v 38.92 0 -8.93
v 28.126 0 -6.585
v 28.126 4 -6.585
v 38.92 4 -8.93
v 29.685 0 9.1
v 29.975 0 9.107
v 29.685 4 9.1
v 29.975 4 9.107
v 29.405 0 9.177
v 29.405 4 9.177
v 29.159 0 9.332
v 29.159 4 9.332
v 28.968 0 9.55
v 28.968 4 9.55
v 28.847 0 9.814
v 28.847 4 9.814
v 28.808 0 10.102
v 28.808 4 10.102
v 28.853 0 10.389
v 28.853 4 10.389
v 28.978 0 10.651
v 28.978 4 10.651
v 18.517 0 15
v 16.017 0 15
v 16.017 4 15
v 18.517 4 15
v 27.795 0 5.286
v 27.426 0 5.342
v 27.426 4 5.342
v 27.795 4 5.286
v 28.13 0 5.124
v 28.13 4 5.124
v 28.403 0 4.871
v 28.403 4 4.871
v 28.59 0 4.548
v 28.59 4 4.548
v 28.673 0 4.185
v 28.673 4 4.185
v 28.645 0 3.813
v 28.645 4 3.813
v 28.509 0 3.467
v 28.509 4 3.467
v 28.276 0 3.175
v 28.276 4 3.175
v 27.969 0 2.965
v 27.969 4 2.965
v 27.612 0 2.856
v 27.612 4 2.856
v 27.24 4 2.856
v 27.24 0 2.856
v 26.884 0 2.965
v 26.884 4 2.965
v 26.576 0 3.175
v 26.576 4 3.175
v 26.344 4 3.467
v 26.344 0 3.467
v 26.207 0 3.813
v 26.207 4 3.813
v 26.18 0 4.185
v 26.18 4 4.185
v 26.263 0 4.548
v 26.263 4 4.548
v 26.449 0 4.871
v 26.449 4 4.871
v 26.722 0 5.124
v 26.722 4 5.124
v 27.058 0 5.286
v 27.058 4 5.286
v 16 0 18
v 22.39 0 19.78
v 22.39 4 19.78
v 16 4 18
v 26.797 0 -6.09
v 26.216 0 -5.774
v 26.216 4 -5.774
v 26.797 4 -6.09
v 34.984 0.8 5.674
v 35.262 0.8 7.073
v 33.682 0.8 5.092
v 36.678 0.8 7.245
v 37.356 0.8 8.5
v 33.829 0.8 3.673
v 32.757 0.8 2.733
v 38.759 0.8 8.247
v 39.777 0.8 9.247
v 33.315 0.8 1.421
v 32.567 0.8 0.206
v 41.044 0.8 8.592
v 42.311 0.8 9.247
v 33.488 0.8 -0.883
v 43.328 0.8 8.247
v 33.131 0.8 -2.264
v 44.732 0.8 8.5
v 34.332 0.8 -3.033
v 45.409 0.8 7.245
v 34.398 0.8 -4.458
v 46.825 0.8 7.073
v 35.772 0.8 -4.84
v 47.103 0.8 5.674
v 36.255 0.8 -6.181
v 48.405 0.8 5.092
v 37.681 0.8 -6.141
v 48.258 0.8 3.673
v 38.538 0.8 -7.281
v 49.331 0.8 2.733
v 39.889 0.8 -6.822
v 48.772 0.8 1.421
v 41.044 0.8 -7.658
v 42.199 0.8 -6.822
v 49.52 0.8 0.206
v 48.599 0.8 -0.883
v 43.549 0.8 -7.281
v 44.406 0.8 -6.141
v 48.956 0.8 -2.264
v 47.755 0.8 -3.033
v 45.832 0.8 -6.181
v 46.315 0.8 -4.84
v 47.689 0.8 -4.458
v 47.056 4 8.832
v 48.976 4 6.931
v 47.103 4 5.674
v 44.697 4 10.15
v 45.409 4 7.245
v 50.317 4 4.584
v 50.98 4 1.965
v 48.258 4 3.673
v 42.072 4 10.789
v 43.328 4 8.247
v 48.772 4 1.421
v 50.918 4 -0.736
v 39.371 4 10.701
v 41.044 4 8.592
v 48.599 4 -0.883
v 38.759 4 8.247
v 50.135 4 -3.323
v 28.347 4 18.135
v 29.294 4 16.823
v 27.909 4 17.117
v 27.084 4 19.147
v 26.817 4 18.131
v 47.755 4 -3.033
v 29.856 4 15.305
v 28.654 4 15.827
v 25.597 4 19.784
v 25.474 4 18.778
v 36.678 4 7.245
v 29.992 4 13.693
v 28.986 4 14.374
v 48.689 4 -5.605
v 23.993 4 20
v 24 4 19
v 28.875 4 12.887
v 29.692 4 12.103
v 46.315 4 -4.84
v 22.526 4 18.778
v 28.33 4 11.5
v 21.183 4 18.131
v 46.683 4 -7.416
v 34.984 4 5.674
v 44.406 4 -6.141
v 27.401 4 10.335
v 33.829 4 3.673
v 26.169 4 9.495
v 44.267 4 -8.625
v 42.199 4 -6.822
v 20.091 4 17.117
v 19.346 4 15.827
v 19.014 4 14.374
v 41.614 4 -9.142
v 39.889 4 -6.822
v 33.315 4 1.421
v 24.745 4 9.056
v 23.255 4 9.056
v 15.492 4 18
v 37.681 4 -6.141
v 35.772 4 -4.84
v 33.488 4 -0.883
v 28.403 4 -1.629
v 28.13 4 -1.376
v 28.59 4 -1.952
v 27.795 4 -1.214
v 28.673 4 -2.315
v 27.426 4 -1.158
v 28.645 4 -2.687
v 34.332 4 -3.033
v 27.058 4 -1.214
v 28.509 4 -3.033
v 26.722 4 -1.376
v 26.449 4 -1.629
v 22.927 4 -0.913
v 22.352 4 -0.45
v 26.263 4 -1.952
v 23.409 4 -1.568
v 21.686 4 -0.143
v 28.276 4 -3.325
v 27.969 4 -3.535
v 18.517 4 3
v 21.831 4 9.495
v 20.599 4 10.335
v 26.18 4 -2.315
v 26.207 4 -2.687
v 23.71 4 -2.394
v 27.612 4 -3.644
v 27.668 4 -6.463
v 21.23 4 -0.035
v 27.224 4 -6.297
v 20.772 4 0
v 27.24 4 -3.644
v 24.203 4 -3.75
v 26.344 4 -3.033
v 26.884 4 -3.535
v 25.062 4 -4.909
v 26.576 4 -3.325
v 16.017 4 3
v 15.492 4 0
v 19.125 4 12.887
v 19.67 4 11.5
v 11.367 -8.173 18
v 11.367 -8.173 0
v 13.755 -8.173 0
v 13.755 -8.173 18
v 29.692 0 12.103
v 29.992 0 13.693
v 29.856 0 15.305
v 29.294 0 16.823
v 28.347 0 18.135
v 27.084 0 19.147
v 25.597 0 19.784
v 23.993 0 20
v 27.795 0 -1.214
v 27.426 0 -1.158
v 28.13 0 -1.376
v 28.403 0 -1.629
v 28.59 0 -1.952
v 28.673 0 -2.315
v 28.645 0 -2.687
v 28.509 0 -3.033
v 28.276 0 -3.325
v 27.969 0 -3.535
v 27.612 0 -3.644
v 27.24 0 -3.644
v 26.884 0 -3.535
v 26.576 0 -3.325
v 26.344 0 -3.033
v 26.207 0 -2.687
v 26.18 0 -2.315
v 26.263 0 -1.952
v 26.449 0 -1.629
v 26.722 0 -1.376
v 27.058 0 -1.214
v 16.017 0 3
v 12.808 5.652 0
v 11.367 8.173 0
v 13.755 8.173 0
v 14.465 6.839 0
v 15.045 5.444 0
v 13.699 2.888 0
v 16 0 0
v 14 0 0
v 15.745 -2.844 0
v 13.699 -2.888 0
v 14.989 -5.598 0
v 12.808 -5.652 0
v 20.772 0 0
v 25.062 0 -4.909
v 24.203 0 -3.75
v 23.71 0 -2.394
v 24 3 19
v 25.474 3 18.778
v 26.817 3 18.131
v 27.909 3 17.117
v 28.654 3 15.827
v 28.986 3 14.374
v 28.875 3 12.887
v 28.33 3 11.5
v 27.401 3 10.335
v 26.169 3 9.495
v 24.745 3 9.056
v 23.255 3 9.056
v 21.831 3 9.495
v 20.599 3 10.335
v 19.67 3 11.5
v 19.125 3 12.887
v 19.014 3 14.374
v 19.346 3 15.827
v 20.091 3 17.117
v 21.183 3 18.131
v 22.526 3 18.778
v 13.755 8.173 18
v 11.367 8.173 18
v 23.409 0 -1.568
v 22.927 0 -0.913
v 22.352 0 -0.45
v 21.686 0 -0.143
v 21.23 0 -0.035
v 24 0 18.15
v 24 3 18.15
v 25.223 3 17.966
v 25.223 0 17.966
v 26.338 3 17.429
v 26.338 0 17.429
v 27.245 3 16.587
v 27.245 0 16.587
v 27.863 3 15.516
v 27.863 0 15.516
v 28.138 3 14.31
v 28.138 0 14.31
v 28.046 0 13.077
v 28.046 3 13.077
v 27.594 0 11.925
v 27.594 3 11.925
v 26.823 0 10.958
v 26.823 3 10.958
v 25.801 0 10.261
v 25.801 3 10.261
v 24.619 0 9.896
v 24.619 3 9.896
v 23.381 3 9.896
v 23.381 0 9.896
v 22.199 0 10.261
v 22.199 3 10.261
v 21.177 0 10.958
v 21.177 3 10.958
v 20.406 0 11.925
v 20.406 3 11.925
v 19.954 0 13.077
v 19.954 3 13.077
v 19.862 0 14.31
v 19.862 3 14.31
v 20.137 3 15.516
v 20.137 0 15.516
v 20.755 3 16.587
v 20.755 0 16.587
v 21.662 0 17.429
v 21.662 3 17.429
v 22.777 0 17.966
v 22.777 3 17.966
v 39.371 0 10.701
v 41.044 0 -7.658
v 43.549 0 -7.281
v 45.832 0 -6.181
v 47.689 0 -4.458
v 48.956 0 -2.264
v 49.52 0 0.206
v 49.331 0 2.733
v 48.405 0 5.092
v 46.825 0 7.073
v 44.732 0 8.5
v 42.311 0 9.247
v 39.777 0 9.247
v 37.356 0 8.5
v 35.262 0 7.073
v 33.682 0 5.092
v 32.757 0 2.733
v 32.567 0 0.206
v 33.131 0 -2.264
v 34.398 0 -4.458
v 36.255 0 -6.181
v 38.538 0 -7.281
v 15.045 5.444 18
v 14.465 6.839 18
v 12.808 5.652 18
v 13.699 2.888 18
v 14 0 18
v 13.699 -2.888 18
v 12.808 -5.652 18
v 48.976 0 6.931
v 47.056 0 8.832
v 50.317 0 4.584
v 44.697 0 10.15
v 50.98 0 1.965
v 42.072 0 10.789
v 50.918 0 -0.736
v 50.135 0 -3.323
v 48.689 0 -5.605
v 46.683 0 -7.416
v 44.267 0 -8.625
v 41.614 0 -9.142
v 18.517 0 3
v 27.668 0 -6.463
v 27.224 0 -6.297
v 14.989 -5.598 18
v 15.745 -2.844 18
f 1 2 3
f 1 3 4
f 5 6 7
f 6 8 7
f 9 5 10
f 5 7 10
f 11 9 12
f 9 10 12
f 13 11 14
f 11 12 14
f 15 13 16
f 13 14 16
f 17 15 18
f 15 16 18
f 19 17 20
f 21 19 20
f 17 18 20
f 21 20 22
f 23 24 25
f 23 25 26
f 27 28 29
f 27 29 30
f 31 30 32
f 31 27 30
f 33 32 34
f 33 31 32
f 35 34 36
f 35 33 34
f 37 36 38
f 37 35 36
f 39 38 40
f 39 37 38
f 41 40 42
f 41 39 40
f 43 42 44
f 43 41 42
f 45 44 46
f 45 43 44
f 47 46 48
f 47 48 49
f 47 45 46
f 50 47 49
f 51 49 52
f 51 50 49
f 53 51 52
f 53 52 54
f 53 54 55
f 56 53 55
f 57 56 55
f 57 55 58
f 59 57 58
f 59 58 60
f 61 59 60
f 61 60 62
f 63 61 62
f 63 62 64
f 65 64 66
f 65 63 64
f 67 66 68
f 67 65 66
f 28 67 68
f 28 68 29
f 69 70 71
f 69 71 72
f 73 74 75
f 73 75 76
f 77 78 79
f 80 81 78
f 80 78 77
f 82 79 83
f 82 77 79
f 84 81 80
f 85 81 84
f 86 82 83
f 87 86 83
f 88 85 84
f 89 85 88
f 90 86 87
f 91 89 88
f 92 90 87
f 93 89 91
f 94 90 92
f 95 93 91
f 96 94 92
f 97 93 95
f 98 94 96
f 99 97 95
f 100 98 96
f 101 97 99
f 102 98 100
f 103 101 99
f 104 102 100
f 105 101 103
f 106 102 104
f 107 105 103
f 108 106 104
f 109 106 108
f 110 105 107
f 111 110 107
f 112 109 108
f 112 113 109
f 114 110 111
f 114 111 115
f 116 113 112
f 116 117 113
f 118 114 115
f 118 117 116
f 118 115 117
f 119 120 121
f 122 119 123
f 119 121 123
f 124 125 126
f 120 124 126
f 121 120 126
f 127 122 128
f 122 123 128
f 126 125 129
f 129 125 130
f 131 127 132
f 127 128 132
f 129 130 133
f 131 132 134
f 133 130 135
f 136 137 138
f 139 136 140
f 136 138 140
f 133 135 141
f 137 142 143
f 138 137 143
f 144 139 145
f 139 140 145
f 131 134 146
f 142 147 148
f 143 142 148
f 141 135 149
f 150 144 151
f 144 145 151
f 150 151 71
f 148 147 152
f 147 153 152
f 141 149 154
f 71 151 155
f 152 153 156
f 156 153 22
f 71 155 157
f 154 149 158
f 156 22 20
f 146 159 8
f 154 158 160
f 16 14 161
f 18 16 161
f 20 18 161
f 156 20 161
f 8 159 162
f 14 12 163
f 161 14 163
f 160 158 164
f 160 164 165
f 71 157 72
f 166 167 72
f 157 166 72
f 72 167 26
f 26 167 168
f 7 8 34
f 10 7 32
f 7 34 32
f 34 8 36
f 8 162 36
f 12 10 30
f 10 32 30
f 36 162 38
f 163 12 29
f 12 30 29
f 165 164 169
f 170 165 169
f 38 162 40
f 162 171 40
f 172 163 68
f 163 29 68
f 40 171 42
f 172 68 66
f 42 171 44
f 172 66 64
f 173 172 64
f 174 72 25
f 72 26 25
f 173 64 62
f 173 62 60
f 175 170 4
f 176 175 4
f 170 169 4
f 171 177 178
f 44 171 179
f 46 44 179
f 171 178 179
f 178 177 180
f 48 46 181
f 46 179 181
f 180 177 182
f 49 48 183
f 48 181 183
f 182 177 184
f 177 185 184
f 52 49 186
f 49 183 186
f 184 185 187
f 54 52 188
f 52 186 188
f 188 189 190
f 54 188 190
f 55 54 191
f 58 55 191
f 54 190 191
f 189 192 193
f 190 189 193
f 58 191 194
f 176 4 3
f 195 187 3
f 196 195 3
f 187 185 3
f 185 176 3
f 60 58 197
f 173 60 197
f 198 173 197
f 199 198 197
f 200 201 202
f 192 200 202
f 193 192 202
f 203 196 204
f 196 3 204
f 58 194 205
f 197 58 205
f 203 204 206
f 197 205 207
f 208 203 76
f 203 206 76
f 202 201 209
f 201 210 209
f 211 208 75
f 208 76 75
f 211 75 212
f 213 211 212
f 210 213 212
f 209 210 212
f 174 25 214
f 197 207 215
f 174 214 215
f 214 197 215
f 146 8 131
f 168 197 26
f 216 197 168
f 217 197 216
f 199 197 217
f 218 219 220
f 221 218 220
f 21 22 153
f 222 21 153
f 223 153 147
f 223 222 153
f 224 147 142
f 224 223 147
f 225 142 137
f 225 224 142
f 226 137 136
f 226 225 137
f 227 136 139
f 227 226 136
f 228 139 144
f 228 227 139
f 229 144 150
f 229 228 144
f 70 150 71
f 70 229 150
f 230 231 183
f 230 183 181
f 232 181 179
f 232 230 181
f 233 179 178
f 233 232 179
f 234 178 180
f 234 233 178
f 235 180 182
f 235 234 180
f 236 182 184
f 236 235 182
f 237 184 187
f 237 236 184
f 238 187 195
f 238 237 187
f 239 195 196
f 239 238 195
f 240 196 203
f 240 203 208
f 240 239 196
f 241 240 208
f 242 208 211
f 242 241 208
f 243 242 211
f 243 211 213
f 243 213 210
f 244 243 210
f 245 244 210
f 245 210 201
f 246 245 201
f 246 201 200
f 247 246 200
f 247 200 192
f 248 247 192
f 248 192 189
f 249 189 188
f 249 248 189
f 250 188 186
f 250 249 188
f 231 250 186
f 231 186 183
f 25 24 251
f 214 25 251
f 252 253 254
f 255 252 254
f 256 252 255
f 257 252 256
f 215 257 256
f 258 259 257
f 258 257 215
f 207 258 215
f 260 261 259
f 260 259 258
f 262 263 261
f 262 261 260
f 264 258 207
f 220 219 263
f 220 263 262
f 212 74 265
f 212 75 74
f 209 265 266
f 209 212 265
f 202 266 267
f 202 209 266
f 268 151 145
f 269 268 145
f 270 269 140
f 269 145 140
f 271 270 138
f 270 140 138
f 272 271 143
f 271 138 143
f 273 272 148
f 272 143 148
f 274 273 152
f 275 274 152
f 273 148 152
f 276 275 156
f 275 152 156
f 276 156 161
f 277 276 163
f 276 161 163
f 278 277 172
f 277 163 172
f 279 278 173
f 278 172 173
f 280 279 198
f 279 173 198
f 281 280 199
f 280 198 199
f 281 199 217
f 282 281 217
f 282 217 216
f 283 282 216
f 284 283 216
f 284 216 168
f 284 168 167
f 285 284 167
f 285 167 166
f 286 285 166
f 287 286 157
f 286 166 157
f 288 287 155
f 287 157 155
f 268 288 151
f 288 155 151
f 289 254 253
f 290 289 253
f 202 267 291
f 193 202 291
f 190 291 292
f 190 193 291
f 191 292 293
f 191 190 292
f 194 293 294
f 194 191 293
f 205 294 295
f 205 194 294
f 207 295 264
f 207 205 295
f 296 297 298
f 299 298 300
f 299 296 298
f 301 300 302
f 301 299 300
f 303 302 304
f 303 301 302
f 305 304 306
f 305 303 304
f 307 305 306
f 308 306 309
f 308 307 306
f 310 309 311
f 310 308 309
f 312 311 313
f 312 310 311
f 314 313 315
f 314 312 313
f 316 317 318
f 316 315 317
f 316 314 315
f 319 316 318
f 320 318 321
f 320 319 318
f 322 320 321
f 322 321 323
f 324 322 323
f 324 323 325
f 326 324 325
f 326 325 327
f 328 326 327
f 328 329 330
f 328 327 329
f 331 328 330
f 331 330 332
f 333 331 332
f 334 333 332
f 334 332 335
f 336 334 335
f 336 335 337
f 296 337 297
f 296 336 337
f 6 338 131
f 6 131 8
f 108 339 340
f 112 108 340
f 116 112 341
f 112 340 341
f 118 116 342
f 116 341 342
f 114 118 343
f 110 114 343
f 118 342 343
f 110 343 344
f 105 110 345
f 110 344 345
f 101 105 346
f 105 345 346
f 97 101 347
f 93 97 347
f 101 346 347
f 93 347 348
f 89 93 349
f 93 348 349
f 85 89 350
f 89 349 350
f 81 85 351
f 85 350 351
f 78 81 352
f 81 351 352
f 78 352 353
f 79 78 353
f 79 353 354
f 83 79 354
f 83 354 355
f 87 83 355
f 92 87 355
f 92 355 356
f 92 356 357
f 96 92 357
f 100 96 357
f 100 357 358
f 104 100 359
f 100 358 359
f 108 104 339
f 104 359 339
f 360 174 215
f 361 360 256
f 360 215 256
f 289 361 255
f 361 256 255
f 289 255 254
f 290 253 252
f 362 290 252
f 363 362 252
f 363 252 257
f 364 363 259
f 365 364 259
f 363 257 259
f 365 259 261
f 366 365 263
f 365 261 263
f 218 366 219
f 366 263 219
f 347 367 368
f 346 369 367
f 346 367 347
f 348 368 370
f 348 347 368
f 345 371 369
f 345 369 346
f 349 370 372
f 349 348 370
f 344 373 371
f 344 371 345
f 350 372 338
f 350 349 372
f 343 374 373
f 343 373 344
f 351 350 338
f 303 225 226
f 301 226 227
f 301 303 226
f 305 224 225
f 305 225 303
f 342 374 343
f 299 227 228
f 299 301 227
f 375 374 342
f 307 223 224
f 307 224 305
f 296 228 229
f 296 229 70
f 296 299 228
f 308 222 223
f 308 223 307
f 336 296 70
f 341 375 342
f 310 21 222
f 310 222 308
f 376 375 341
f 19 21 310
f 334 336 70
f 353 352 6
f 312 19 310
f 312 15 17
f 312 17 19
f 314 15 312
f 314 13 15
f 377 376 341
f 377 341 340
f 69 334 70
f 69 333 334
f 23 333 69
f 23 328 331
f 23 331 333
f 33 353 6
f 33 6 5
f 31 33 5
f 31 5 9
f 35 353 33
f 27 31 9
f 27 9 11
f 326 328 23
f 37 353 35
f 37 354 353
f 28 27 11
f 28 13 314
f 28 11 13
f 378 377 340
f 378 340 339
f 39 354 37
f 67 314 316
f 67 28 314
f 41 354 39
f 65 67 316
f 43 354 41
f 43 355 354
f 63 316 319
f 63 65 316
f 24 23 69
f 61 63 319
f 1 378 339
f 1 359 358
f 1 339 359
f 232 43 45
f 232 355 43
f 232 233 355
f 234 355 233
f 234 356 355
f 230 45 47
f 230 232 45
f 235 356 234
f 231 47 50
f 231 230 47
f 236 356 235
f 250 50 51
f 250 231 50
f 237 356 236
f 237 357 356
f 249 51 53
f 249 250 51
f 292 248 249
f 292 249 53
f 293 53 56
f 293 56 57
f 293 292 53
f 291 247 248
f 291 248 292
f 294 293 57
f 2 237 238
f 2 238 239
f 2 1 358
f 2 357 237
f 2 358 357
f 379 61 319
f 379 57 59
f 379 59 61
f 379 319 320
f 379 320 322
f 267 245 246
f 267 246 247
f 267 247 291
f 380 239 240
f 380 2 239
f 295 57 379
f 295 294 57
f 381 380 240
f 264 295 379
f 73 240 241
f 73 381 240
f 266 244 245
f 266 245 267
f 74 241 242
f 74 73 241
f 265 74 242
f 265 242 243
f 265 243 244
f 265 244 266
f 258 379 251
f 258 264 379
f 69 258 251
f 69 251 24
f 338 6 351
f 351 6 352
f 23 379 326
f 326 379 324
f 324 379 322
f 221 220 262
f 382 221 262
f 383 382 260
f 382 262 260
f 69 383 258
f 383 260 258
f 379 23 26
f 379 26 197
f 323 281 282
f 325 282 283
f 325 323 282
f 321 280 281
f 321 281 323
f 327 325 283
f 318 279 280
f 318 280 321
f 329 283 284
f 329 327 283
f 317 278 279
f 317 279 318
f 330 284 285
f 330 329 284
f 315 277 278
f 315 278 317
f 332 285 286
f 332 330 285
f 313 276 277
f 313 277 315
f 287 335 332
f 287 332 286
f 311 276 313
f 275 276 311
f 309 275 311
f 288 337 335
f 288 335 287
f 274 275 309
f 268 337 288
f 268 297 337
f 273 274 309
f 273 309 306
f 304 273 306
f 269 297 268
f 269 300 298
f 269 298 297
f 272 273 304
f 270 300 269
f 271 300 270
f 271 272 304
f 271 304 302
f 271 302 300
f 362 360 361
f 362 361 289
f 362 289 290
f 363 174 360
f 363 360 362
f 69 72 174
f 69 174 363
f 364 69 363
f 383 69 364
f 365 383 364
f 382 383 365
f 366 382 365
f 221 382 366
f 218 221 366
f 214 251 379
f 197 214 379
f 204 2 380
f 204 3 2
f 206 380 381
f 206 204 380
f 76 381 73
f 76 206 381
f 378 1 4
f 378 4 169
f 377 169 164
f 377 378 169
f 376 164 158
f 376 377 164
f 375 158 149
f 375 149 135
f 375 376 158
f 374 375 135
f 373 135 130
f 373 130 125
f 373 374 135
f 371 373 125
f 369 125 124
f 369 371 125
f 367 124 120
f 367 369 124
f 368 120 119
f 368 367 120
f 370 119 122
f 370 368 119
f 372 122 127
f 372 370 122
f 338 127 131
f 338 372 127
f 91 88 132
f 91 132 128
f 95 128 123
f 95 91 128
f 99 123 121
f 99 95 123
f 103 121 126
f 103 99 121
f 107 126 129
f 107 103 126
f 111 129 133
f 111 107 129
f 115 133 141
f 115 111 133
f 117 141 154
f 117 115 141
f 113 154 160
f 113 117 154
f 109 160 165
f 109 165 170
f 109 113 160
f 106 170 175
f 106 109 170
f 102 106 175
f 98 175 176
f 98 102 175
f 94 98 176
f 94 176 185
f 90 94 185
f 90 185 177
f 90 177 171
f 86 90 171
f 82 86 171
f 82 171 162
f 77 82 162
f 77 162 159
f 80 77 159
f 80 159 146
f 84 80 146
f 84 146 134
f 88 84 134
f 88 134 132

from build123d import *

# Parameters (mm, degrees)
EXTRUDE_1_DEPTH     = 18
SKETCH_3_R          = 4.15
SKETCH_3_R_2        = 7.75
SKETCH_3_R_3        = 1.25
SKETCH_3_W          = 2.5
SKETCH_3_H          = 12
EXTRUDE_2_DEPTH     = 4
FILLET_1_R          = 5
FILLET_2_R          = 3
FILLET_3_R          = 1
SKETCH_7_R          = 8.5
CUT_EXTRUDE_2_DEPTH = 0.8
SKETCH_8_R          = 5
CUT_EXTRUDE_3_DEPTH = 1


with BuildPart() as part:
    # 草图1 → 凸台-拉伸1 (new body)
    with BuildSketch(Plane.XY):
        with BuildLine():
            Line((13.754950724, 8.173208097), (11.36655926, 8.173208097))
            ThreePointArc((11.36655926, 8.173208097), (14, 0), (11.36655926, -8.173208097))
            Line((11.36655926, -8.173208097), (13.754950724, -8.173208097))
            ThreePointArc((13.754950724, -8.173208097), (16, 0), (13.754950724, 8.173208097))
        make_face()
    extrude(amount=EXTRUDE_1_DEPTH)

    # 草图3 → 凸台-拉伸2 (add)
    with BuildSketch(Plane(origin=(0, 0, 0), x_dir=(1, 0, 0), z_dir=(0, 1, 0))):
        with BuildLine():
            Line((16, -18), (14.877475362, -18))
            Line((14.877475362, -18), (14.877475362, 0))
            Line((14.877475362, 0), (16, 0))
            Line((16, 0), (23.606969391, 0))
            Line((23.606969391, 0), (23.606969391, 4.353528312))
            Line((23.606969391, 4.353528312), (27.426147231, 6.432993818))
            Line((27.426147231, 6.432993818), (38.92049676, 8.930407807))
            ThreePointArc((38.92049676, 8.930407807), (51.041058959, -0.612171869), (39.370999256, -10.700708007))
            Line((39.370999256, -10.700708007), (26.396794679, -8.499511361))
            ThreePointArc((26.396794679, -8.499511361), (29.653921129, -16.00827684), (22.389974874, -19.779949748))
            Line((22.389974874, -19.779949748), (16, -18))
        make_face()
        with Locations(Location((24, -14, 0), (0, 0, 270))):
            Circle(SKETCH_3_R, mode=Mode.SUBTRACT)
        with Locations(Location((41.043691062, -0.841595363, 0), (0, 0, 270))):
            Circle(SKETCH_3_R_2, mode=Mode.SUBTRACT)
        with Locations(Location((27.426147231, -4.091595363, 0), (0, 0, 270))):
            Circle(SKETCH_3_R_3, mode=Mode.SUBTRACT)
        with Locations(Location((27.426147231, 2.408404637, 0), (0, 0, 270))):
            Circle(SKETCH_3_R_3, mode=Mode.SUBTRACT)
        with Locations((17.267287819, -9)):
            Rectangle(SKETCH_3_W, SKETCH_3_H, mode=Mode.SUBTRACT)
    extrude(amount=EXTRUDE_2_DEPTH)

    # 圆角1
    fillet_1_edges = [part.edges().sort_by_distance(p)[0] for p in [
        (27.426147231, 2, -6.432993818),
        (23.606969391, 2, -4.353528312),
    ]]
    fillet(fillet_1_edges, radius=FILLET_1_R)

    # 圆角2
    fillet_2_edges = [part.edges().sort_by_distance(p)[0] for p in [
        (23.606969391, 2, 0),
    ]]
    fillet(fillet_2_edges, radius=FILLET_2_R)

    # 圆角3
    fillet_3_edges = [part.edges().sort_by_distance(p)[0] for p in [
        (26.396794679, 2, 8.499511361),
    ]]
    fillet(fillet_3_edges, radius=FILLET_3_R)

    # 草图7 → 切除-拉伸2 (cut)
    with BuildSketch(Plane.XZ):
        with Locations(Location((41.043691062, 0.841595363, 0), (0, 0, 270))):
            Circle(SKETCH_7_R)
    extrude(amount=-CUT_EXTRUDE_2_DEPTH, mode=Mode.SUBTRACT)

    # 草图8 → 切除-拉伸3 (cut)
    with BuildSketch(Plane(origin=(0, 4, 0), x_dir=(1, 0, 0), z_dir=(0, 1, 0))):
        with Locations(Location((24, -14, 0), (0, 0, 270))):
            Circle(SKETCH_8_R)
    extrude(amount=-CUT_EXTRUDE_3_DEPTH, mode=Mode.SUBTRACT)


solid = part.part
